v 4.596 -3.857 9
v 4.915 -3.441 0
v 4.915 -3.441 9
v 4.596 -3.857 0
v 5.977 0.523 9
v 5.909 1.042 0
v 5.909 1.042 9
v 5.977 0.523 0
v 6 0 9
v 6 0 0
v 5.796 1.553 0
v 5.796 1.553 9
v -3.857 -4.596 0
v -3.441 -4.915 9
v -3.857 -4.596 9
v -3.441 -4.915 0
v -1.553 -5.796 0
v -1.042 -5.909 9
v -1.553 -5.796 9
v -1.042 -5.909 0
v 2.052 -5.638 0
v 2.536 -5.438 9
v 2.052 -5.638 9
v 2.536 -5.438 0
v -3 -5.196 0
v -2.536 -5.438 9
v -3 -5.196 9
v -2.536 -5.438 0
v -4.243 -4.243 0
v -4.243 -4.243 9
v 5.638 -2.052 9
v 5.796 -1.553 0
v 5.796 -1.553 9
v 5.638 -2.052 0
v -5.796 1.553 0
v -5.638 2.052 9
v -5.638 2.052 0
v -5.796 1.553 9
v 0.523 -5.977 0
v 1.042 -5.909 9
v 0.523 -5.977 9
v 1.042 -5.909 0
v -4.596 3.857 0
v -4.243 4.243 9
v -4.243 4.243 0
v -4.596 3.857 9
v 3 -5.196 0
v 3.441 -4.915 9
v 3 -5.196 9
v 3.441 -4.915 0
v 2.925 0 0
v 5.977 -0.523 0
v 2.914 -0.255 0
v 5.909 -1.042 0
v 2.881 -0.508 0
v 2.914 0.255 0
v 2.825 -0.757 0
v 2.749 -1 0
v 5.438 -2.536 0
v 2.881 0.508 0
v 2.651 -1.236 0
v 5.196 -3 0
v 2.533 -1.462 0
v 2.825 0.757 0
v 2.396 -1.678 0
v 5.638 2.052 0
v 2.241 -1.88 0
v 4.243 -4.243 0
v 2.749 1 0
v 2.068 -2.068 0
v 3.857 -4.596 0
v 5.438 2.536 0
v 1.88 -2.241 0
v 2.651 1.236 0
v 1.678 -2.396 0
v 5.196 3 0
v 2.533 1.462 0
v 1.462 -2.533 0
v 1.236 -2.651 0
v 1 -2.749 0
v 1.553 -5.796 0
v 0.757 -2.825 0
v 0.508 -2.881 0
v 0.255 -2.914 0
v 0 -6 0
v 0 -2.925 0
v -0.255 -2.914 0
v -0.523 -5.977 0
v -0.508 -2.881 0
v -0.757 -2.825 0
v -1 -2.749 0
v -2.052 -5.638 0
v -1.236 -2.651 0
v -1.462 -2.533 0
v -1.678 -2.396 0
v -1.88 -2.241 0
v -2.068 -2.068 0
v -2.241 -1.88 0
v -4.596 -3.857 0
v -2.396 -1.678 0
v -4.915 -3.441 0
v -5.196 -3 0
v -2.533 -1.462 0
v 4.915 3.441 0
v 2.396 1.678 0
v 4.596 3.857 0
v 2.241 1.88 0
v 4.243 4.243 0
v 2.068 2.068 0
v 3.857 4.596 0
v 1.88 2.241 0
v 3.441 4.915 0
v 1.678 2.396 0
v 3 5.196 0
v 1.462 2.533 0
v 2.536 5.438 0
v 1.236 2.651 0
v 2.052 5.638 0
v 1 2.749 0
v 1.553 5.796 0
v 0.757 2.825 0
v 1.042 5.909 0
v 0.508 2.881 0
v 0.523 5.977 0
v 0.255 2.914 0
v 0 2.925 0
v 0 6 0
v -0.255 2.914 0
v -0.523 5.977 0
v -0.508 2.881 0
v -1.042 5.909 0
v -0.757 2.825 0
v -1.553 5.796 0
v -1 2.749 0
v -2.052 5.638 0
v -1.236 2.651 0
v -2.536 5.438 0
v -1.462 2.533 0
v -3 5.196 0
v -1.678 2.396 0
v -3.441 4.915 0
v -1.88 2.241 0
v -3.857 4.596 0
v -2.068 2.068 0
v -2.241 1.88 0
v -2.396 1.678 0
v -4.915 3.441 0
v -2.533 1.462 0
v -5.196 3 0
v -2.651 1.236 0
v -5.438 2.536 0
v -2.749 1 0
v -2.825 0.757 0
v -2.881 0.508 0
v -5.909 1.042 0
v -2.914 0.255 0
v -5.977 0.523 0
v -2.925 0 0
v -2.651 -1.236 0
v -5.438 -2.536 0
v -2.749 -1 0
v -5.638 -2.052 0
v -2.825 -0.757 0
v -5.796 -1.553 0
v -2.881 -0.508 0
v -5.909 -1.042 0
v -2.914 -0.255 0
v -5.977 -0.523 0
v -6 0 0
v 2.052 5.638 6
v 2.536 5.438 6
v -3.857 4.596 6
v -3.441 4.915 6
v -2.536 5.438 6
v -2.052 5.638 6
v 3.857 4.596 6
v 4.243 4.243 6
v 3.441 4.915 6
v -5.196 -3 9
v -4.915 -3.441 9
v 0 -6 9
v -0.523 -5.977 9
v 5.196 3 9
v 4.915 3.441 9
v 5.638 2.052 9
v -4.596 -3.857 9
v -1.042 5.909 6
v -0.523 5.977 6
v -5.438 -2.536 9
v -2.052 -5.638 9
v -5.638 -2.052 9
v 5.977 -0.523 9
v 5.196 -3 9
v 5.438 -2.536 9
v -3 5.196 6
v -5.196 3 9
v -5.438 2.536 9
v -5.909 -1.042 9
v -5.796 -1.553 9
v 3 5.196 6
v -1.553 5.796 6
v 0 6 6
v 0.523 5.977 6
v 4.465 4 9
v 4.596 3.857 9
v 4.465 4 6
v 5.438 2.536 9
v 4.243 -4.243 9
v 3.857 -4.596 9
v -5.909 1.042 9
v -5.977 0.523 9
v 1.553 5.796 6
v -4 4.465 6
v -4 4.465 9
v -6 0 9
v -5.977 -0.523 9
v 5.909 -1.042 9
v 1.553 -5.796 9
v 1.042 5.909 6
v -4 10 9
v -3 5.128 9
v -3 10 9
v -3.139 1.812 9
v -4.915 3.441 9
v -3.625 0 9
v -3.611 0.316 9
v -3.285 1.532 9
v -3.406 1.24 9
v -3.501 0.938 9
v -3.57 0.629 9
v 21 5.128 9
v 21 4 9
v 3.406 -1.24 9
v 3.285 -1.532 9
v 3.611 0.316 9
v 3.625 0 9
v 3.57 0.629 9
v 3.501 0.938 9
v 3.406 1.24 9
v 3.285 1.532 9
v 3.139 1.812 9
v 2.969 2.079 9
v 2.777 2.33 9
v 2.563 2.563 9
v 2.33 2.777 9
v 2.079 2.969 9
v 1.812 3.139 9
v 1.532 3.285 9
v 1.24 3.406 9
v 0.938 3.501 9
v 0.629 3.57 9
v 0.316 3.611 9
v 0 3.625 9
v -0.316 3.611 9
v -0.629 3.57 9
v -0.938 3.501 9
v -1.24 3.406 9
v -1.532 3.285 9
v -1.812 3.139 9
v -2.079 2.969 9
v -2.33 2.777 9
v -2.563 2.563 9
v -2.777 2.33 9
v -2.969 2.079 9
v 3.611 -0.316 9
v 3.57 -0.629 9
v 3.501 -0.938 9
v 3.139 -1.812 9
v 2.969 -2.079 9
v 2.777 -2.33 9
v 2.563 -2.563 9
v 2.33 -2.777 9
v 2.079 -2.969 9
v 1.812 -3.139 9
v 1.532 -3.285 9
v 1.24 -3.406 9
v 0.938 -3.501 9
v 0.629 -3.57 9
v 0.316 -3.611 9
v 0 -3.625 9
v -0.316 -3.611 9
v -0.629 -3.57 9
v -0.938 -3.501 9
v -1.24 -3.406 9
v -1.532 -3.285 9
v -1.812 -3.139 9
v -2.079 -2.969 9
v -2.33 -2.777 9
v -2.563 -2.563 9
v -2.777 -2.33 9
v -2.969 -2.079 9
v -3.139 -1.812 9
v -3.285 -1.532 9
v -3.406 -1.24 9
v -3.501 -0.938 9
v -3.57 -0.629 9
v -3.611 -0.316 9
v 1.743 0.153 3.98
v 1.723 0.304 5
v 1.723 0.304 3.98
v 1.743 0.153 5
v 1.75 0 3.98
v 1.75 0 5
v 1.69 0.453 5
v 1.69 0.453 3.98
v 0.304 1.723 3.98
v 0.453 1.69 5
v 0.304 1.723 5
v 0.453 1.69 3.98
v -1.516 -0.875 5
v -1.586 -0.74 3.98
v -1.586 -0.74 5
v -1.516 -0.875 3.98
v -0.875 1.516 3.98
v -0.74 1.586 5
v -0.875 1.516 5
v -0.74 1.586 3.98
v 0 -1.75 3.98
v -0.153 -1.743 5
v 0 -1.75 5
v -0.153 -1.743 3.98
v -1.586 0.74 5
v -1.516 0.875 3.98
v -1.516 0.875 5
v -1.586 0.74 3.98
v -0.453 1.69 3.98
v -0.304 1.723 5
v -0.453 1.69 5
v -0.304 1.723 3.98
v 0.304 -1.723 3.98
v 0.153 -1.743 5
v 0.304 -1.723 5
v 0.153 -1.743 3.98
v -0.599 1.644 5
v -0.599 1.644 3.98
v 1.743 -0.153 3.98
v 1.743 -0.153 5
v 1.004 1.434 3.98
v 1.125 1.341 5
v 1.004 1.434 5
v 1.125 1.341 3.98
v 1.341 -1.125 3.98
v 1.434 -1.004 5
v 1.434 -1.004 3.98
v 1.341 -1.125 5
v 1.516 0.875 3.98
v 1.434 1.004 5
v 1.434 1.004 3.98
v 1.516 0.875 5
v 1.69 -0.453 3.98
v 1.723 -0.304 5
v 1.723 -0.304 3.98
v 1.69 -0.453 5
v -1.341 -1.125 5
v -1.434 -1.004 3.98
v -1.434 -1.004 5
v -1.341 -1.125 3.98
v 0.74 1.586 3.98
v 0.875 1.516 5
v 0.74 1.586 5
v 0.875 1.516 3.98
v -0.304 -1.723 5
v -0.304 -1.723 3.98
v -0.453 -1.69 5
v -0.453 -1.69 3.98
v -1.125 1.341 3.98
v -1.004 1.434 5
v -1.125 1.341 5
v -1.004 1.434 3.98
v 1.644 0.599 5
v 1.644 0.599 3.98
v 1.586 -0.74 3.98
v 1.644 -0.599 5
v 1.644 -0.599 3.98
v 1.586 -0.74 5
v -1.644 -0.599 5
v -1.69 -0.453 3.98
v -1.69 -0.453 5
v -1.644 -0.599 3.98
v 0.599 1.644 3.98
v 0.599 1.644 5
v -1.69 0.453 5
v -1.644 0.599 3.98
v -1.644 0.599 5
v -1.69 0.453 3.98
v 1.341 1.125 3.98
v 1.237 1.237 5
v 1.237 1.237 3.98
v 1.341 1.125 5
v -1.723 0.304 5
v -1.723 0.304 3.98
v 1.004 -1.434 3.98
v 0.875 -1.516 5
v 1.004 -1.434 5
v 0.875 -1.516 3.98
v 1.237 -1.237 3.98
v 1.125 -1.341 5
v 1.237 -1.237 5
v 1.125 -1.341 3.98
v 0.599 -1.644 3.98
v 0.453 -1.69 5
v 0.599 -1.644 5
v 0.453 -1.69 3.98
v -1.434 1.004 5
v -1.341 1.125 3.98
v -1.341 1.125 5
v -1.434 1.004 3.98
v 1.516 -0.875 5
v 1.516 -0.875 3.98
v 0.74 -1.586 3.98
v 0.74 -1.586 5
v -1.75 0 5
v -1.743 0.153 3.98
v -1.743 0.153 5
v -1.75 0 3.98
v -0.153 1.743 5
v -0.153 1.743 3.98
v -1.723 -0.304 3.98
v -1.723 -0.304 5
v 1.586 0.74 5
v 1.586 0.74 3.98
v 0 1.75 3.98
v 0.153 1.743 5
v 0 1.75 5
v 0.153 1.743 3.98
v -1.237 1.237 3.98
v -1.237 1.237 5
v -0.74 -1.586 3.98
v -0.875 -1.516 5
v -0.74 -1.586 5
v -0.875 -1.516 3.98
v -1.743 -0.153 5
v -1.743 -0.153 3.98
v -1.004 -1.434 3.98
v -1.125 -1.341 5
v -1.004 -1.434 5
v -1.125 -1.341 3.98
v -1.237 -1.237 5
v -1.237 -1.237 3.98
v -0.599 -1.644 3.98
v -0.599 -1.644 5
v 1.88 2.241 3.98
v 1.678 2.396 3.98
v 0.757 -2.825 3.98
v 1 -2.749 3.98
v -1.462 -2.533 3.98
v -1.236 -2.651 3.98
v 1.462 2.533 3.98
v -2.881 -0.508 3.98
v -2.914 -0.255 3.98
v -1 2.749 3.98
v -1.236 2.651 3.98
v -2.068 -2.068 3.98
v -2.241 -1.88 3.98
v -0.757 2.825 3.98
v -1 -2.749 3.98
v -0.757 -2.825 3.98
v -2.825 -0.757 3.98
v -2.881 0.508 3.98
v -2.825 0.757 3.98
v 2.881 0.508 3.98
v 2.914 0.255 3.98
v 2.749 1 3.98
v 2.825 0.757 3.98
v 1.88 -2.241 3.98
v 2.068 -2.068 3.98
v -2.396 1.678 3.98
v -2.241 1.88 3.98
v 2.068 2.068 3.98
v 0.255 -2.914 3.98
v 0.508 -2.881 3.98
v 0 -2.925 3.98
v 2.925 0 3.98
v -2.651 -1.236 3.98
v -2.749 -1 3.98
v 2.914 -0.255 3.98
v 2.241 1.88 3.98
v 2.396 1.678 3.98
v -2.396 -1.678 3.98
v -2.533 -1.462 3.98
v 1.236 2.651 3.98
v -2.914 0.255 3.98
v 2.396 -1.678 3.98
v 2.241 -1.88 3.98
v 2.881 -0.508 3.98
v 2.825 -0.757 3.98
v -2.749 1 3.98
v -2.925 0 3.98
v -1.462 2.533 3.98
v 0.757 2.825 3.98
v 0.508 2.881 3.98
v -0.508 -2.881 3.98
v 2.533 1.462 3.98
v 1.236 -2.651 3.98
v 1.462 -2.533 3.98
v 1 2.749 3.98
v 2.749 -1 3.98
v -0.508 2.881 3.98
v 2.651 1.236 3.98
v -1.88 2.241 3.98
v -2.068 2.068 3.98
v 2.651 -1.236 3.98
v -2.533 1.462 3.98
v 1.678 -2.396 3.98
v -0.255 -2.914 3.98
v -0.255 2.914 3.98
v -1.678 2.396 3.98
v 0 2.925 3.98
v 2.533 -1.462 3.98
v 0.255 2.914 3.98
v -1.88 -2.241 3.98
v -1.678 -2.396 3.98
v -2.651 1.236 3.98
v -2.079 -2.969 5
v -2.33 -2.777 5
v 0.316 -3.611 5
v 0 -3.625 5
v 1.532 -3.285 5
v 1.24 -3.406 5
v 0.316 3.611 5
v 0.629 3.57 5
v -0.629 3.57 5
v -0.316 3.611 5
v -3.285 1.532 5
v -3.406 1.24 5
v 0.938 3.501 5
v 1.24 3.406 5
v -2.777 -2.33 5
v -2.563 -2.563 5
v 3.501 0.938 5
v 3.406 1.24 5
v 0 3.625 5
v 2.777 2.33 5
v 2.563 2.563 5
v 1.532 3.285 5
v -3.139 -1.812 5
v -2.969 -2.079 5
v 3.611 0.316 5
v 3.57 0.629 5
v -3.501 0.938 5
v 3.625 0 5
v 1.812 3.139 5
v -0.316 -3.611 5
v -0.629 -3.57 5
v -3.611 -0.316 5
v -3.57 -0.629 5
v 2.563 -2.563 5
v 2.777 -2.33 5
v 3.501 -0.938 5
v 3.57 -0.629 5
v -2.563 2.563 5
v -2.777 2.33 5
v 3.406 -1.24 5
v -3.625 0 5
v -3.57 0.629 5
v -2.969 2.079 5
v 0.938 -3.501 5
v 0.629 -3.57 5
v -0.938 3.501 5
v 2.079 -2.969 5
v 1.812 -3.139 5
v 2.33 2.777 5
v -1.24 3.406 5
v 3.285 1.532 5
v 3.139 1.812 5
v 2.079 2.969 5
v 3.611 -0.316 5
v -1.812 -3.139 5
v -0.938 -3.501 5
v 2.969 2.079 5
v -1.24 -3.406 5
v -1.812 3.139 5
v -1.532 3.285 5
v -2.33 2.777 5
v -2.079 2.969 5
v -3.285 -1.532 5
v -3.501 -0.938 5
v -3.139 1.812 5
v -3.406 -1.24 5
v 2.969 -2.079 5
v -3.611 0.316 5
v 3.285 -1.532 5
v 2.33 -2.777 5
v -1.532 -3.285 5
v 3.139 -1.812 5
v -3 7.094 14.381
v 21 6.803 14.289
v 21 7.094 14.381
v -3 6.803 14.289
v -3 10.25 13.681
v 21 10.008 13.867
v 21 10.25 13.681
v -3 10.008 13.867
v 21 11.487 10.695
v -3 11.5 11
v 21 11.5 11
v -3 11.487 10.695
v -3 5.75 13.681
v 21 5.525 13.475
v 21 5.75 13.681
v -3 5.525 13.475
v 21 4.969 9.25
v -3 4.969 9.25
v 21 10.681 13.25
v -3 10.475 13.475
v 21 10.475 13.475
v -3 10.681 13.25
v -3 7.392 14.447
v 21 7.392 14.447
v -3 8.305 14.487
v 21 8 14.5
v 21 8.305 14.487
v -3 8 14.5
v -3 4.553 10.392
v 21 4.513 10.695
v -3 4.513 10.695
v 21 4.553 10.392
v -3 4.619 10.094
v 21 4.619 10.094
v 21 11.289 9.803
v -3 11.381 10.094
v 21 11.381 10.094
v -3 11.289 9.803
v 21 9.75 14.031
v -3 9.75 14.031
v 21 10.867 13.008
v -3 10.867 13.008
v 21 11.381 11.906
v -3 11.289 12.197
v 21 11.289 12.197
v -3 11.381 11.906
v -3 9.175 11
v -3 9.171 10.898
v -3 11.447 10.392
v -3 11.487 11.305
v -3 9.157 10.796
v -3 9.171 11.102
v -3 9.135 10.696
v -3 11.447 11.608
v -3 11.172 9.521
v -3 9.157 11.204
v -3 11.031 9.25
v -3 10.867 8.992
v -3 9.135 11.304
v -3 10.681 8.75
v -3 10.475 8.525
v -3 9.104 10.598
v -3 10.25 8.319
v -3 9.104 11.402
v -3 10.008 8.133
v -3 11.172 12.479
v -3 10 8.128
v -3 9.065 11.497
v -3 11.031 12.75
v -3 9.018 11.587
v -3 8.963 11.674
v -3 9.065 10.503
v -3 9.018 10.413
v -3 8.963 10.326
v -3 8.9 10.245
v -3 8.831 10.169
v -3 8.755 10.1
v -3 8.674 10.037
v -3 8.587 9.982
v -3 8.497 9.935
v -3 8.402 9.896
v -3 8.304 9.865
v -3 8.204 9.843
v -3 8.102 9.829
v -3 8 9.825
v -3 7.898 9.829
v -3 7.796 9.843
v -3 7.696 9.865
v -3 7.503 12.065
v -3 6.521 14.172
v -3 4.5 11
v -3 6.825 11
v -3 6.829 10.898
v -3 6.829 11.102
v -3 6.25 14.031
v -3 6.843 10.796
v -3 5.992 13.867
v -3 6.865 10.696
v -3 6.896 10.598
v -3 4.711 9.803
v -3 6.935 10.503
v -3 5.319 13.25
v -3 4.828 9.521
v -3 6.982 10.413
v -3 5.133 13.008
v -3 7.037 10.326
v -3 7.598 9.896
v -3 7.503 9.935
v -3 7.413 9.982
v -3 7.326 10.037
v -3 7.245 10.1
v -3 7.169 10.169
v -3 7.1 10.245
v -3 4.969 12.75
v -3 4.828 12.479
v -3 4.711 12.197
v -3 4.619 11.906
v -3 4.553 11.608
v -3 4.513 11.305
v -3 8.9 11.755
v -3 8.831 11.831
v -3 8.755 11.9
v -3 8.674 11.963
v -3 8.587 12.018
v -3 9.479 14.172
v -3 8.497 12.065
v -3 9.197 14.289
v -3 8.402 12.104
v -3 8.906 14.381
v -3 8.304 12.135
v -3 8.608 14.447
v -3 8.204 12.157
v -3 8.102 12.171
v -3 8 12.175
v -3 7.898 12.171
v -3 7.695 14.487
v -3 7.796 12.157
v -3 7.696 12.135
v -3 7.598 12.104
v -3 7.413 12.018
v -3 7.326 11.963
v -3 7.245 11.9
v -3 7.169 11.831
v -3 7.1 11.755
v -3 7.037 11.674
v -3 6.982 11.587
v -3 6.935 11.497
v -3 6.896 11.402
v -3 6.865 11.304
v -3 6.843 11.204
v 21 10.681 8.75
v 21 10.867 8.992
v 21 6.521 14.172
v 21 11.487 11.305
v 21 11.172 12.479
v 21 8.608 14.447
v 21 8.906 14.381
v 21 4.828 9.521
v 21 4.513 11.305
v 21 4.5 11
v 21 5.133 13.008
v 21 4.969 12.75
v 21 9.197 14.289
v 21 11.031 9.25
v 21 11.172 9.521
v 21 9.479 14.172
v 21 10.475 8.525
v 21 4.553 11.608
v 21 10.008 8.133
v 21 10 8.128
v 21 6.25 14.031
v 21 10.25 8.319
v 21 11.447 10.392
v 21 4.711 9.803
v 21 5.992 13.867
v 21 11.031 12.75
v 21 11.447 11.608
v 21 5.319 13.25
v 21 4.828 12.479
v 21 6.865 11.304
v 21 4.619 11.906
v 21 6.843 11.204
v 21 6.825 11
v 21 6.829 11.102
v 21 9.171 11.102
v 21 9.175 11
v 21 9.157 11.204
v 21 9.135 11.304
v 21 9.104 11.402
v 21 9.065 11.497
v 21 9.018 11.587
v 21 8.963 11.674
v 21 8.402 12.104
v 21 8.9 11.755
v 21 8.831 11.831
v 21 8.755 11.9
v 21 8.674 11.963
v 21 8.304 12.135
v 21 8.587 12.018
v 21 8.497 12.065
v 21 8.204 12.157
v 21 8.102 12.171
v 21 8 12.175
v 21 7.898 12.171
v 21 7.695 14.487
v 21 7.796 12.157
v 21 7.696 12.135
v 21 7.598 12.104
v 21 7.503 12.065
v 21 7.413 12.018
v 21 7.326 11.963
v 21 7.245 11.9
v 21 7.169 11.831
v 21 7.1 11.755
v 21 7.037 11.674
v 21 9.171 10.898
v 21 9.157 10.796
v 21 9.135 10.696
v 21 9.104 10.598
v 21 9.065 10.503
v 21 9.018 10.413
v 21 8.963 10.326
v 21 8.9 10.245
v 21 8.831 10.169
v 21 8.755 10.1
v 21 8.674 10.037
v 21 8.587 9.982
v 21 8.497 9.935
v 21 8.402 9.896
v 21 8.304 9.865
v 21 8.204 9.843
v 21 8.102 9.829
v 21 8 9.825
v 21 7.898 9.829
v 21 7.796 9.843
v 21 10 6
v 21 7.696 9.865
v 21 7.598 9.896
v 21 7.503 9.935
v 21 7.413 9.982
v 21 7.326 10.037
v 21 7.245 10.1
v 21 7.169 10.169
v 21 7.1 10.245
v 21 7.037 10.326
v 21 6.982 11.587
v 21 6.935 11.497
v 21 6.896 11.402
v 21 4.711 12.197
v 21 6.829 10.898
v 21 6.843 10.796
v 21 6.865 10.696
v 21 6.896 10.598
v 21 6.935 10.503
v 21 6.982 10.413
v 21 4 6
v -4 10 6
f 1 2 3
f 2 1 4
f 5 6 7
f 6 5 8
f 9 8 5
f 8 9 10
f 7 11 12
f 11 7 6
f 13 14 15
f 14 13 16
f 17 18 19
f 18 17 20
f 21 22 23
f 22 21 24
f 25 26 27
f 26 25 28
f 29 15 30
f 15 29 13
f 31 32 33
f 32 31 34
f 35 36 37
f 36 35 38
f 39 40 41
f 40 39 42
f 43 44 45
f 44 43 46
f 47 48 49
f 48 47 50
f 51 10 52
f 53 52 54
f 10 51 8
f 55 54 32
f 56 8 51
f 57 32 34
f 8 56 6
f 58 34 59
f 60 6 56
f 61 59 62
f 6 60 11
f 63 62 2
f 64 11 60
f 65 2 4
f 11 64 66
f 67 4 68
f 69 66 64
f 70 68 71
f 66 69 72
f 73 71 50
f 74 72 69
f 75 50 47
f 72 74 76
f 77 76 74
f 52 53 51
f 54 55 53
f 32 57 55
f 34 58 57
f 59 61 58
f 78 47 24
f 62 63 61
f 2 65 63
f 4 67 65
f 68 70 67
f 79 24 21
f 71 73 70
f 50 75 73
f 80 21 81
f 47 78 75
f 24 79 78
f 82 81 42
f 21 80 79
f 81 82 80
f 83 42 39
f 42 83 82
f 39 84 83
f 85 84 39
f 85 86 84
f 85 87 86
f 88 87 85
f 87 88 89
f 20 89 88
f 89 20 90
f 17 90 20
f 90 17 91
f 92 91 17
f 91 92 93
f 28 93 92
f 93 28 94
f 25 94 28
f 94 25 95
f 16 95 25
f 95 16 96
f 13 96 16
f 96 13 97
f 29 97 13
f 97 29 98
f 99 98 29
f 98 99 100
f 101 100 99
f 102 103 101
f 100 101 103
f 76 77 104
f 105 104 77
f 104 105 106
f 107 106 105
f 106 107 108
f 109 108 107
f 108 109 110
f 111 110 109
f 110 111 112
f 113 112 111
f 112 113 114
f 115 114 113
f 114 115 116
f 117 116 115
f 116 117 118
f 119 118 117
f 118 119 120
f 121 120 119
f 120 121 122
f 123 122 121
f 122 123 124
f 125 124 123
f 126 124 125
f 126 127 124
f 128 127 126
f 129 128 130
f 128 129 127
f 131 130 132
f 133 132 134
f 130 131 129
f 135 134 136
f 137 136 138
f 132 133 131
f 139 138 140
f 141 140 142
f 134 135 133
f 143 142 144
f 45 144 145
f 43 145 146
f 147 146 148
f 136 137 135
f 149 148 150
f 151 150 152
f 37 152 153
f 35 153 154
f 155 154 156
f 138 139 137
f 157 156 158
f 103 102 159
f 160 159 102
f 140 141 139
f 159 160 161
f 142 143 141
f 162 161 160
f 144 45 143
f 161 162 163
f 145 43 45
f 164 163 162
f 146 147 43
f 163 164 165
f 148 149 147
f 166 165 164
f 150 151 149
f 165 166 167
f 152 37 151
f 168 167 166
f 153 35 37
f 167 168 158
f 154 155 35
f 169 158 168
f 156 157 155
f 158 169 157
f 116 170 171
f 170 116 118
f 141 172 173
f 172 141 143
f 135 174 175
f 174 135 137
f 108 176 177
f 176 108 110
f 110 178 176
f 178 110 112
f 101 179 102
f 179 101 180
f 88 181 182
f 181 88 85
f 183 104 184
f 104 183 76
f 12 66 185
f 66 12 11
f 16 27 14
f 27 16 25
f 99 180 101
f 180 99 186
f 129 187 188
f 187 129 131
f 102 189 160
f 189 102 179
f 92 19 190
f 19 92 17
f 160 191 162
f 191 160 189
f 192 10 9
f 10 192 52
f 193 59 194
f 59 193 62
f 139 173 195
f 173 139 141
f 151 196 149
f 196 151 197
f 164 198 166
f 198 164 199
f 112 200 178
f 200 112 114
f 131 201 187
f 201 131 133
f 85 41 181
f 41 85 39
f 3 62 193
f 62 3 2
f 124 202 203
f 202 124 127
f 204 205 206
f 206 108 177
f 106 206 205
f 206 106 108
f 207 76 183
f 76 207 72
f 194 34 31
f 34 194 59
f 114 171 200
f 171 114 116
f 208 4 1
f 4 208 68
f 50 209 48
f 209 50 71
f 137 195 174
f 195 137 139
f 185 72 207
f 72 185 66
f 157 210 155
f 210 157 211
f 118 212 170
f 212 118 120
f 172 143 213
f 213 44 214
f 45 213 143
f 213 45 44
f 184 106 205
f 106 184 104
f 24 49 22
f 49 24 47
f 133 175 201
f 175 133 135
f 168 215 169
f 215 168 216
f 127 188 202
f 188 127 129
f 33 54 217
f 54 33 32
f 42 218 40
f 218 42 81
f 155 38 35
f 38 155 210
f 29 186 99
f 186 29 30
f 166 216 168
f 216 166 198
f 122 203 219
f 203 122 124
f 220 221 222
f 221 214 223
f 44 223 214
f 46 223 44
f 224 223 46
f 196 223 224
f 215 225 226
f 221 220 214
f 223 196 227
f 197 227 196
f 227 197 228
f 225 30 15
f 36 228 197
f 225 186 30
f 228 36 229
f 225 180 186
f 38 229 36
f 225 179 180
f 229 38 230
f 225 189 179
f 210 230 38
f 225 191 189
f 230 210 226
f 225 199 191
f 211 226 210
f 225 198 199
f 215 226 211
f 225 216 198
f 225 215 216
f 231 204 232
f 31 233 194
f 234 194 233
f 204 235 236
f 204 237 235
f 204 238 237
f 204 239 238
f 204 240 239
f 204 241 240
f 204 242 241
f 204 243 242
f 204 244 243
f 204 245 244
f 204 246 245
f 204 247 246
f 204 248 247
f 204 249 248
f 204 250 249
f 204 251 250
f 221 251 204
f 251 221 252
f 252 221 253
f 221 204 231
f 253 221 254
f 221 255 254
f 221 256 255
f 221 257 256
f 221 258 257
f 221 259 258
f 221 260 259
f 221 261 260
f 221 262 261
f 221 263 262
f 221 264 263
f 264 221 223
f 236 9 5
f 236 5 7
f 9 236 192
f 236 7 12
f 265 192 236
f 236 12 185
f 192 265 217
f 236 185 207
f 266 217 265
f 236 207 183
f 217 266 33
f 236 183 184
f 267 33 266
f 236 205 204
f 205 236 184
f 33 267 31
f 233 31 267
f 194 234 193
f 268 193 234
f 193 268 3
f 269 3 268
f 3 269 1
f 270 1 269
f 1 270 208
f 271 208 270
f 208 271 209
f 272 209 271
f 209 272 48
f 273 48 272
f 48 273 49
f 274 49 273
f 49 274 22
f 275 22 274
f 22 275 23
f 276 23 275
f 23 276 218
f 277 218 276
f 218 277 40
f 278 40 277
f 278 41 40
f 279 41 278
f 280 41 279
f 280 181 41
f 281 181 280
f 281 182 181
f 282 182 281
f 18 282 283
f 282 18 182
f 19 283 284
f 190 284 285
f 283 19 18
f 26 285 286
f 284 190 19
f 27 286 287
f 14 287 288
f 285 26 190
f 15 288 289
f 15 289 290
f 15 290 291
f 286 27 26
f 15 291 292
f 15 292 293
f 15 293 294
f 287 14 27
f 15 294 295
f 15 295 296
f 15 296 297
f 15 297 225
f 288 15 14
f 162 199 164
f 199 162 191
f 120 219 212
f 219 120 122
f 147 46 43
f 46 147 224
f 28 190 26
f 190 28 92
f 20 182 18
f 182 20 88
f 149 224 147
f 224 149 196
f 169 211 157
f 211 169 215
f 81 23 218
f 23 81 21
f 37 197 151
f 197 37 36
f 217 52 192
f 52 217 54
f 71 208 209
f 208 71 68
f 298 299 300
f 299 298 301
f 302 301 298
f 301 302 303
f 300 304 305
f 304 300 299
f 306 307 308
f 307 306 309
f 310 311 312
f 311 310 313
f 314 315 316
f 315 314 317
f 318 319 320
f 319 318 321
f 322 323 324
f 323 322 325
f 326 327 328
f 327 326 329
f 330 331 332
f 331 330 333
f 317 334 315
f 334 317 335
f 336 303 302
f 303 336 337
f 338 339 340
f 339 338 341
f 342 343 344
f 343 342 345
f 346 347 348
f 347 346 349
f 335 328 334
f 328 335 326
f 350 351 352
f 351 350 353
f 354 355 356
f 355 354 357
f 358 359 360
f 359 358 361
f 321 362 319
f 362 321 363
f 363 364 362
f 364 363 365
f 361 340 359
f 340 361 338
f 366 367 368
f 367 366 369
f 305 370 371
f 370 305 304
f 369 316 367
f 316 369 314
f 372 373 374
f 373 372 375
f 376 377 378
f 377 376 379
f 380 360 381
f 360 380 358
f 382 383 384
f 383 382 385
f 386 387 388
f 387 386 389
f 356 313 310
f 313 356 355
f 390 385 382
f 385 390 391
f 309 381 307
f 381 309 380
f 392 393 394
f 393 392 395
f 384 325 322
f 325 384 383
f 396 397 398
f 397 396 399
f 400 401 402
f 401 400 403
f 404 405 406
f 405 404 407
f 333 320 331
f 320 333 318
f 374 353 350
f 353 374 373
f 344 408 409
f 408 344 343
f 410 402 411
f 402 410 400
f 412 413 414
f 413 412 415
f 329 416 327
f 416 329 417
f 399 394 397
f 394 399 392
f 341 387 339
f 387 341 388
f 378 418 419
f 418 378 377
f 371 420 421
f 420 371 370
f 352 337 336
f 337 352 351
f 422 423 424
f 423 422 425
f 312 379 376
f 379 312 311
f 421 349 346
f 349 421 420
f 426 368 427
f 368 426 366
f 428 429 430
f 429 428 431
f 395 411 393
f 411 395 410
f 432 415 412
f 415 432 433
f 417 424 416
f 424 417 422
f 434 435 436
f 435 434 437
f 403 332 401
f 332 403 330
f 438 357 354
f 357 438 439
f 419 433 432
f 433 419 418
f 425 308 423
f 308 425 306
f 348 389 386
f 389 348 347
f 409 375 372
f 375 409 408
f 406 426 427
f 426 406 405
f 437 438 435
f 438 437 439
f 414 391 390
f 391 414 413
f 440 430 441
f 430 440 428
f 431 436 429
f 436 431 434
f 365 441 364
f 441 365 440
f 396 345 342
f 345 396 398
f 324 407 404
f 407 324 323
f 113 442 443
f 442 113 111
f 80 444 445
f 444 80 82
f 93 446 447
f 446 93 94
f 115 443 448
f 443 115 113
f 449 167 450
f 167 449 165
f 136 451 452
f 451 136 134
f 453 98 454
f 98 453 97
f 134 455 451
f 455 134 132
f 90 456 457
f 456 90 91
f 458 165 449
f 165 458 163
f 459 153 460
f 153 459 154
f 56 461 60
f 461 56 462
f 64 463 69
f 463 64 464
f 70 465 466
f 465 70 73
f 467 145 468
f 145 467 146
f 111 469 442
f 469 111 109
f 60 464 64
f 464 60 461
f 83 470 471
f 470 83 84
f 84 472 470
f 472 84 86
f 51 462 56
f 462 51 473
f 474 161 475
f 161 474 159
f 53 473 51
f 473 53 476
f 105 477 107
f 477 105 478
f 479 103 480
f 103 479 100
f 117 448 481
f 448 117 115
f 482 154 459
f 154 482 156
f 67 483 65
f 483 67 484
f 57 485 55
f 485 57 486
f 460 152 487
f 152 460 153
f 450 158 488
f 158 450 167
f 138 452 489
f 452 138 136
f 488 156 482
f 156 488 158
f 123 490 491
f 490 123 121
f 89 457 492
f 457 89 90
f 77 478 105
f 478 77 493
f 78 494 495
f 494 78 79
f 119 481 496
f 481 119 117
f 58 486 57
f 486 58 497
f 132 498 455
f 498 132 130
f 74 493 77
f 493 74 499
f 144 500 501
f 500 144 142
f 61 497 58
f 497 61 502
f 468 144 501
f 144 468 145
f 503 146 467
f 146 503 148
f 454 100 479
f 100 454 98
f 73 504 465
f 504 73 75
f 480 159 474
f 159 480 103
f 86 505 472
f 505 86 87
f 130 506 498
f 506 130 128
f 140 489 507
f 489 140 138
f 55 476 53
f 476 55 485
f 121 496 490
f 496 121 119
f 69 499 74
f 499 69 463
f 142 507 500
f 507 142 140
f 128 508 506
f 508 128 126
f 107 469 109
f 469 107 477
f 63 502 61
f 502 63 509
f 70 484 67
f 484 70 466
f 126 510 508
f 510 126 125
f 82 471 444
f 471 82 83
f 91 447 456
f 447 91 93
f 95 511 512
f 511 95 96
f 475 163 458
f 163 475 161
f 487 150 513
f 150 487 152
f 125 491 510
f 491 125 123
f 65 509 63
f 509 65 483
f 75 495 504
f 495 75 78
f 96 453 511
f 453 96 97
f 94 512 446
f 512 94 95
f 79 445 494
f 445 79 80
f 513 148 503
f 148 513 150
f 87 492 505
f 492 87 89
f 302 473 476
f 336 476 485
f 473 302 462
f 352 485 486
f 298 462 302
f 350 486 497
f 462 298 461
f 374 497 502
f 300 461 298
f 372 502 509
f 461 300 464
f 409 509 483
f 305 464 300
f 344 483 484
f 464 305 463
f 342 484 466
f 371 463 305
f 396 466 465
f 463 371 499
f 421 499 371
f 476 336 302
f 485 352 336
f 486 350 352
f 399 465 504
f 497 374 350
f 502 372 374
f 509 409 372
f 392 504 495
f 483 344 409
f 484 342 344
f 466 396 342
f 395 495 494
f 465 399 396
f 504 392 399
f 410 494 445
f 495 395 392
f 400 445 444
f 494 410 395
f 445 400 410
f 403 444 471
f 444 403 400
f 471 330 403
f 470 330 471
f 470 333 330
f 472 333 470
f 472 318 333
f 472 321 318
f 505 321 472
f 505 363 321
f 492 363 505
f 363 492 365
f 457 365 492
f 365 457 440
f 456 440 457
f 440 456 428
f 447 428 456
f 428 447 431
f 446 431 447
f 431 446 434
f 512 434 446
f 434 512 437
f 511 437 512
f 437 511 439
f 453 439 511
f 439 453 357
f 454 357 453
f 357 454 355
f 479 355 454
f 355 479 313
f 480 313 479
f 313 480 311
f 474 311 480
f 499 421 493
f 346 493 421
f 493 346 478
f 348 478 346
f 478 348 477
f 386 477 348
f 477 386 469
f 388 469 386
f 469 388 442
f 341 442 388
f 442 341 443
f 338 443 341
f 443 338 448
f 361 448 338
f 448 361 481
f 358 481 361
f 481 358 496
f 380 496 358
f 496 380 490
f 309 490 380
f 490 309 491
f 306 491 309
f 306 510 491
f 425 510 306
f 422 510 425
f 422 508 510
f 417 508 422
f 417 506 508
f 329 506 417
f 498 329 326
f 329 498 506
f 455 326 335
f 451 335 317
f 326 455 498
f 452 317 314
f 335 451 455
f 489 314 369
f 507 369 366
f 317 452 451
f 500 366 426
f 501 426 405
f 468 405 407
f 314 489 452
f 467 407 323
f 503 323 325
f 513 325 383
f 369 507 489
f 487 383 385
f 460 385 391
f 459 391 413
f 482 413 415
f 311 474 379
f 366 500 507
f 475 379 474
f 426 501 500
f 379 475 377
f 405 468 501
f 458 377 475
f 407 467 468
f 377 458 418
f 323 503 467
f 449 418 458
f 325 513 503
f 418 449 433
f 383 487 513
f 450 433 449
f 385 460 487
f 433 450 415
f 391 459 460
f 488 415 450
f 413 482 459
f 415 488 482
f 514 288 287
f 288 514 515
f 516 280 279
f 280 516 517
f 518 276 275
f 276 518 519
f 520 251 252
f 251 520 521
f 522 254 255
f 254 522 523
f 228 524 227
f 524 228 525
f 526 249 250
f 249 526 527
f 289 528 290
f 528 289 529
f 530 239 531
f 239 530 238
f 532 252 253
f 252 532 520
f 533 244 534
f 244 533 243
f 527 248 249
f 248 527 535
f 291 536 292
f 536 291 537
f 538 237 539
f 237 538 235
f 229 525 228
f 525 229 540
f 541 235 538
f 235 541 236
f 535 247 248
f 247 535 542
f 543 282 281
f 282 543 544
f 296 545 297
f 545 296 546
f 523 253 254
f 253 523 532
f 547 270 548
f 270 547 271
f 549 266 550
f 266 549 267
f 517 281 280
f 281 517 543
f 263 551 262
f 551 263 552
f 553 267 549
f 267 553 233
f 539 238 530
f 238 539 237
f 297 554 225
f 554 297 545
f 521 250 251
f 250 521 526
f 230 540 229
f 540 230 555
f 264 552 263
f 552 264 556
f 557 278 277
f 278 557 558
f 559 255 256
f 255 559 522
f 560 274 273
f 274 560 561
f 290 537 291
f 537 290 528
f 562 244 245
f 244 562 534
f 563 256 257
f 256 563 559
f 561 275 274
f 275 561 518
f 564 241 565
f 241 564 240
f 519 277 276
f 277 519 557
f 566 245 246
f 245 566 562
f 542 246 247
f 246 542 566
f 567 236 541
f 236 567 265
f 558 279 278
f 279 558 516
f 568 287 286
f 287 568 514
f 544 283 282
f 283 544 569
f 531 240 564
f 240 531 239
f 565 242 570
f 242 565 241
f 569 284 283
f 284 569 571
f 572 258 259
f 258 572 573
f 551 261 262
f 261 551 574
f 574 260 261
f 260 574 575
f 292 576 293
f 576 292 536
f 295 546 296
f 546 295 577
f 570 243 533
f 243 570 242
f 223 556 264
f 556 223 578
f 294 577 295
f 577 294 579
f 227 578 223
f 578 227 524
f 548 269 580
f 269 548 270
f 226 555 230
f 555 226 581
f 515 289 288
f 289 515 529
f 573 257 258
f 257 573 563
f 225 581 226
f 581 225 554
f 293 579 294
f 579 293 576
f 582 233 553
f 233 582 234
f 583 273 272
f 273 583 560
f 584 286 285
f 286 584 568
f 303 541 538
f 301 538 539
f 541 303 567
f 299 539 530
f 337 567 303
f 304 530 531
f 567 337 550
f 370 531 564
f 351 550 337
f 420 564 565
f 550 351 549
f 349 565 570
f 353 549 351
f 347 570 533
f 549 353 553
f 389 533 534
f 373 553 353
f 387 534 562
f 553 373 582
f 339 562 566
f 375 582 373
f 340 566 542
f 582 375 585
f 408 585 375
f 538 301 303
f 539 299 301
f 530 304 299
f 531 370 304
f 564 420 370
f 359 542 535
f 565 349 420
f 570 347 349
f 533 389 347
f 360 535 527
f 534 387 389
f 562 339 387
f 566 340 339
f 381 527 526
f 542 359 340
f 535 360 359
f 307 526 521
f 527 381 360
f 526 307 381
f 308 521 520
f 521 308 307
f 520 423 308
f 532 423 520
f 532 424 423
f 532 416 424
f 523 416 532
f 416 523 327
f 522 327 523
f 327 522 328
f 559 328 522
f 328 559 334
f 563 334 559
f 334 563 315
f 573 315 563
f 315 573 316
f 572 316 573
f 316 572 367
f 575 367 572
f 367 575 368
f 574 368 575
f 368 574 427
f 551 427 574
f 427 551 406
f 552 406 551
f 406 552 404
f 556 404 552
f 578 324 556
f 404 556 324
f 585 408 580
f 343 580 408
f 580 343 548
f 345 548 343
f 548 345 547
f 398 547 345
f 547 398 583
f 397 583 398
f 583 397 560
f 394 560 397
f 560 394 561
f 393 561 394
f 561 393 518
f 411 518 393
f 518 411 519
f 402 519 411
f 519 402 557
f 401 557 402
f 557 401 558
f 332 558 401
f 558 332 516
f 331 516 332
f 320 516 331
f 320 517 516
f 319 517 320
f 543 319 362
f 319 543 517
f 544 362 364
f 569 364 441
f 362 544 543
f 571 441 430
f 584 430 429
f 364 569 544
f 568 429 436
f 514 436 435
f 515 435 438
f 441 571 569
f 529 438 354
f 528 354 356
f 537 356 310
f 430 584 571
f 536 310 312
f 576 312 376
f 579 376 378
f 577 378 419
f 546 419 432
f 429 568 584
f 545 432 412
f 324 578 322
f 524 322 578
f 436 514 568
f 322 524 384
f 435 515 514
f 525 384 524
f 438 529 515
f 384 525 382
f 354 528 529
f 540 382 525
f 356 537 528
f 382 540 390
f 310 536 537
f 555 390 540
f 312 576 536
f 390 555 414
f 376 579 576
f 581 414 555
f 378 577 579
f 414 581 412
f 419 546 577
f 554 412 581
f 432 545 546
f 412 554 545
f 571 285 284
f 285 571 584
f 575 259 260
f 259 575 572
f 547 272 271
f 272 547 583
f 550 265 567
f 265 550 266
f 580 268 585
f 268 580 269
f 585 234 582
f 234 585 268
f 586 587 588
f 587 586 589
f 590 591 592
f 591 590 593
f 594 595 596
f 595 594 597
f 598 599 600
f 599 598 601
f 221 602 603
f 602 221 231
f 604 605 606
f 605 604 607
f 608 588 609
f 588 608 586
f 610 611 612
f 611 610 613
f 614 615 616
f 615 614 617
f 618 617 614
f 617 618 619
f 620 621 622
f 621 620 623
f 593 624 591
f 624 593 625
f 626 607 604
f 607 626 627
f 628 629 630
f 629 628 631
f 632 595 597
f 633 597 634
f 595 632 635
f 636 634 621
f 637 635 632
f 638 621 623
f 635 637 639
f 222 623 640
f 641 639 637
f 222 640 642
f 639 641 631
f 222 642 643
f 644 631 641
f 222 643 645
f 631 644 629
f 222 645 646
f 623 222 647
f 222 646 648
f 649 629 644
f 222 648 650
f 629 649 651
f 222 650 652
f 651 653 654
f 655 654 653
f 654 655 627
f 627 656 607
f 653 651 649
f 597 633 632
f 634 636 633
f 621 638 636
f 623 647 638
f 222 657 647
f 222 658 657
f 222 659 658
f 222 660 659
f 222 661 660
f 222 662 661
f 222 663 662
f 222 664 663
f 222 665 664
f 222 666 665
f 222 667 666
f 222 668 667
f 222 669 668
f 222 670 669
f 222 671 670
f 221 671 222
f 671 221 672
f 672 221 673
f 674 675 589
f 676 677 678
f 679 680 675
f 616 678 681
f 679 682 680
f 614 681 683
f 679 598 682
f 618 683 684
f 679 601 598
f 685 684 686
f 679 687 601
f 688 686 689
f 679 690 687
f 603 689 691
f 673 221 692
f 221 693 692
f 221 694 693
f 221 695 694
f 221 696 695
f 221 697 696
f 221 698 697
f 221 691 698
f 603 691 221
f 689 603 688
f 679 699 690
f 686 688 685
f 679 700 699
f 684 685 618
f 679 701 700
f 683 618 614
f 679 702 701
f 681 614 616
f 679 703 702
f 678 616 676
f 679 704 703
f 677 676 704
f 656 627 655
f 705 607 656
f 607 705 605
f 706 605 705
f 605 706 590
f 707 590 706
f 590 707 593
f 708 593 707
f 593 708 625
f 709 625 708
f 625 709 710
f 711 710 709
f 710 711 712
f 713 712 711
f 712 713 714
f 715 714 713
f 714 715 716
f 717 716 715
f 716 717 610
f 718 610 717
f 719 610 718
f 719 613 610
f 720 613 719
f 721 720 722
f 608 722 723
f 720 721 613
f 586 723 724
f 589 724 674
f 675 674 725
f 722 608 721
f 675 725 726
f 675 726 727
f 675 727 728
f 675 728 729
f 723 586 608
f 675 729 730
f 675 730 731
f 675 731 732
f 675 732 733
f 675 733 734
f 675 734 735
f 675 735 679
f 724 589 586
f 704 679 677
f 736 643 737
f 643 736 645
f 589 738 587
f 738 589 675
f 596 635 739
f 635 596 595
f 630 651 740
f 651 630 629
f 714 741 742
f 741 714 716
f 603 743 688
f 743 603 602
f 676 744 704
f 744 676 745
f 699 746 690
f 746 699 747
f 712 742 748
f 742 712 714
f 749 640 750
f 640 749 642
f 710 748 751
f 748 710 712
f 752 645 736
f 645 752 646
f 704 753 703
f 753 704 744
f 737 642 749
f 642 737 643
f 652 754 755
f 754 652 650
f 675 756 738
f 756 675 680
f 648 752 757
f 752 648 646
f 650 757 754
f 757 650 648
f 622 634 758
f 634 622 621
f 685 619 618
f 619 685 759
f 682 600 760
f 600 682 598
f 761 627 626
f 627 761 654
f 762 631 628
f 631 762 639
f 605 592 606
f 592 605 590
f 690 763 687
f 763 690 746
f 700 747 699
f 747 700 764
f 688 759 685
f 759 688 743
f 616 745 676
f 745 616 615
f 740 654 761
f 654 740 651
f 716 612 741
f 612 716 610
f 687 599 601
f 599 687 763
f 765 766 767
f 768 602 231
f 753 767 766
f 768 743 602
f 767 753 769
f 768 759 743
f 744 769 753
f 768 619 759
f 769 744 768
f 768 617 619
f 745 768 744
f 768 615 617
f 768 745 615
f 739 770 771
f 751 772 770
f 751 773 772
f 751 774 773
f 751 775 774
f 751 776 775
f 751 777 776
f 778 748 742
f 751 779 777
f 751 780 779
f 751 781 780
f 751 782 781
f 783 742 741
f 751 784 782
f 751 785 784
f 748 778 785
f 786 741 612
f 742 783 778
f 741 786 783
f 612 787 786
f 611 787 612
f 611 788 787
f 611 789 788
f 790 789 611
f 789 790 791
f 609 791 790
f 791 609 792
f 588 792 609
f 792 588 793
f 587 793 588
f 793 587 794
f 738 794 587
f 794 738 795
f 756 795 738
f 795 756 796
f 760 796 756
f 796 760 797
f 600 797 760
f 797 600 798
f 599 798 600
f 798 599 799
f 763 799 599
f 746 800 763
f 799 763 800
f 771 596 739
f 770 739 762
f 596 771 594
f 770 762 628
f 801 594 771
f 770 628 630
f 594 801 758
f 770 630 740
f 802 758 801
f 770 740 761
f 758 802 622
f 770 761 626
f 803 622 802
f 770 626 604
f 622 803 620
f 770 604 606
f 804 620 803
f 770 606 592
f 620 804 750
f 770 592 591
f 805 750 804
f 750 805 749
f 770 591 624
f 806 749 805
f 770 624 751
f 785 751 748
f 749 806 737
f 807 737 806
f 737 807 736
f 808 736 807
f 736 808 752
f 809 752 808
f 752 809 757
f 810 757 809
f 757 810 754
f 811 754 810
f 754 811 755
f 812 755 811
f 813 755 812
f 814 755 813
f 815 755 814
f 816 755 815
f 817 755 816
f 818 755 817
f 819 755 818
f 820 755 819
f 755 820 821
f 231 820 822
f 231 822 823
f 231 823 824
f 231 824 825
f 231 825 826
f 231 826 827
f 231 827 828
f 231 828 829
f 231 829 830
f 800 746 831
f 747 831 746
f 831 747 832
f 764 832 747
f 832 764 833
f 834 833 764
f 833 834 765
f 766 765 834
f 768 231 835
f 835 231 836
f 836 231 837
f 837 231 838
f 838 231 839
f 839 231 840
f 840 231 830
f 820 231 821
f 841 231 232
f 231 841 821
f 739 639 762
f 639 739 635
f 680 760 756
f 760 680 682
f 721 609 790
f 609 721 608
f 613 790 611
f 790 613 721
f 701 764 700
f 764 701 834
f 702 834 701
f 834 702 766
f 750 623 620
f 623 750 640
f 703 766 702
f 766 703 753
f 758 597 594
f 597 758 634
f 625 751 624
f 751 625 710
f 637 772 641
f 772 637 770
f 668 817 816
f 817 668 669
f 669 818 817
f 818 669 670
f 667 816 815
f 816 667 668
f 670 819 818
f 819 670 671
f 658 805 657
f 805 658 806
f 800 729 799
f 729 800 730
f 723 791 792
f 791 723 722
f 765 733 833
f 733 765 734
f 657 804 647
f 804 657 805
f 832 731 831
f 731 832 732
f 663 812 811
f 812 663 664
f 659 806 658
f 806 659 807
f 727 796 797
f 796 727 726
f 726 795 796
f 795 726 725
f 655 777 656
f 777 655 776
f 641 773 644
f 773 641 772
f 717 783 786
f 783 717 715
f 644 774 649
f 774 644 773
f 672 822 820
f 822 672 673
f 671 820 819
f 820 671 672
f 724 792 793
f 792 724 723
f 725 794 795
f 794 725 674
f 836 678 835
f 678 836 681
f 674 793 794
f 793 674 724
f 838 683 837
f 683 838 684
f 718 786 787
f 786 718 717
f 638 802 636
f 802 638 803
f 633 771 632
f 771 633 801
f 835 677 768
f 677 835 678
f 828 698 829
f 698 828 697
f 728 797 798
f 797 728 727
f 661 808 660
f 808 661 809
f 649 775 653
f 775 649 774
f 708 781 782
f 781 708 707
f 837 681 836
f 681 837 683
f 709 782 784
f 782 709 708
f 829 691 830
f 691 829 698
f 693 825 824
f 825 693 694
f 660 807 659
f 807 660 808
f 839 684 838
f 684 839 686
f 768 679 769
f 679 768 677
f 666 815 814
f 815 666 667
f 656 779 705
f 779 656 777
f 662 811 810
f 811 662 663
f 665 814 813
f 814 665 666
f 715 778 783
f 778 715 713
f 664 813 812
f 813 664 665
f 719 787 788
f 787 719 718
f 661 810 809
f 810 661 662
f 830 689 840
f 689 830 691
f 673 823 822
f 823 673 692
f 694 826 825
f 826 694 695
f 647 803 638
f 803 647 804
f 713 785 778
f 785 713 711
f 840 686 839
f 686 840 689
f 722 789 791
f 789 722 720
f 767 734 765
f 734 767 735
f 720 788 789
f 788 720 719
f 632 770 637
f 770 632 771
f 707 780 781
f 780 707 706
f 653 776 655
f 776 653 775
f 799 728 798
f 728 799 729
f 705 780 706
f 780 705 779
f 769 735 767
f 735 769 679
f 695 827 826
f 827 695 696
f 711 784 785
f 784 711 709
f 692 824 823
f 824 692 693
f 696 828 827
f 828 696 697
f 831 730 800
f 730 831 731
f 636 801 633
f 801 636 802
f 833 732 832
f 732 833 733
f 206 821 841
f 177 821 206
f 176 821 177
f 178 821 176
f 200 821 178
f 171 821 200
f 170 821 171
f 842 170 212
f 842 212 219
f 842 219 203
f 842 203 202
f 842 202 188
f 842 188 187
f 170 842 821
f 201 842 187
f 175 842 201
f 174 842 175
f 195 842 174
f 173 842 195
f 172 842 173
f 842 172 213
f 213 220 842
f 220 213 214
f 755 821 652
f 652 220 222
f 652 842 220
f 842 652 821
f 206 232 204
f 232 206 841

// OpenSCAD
// brass rod holder

// outer hole 5.85
// screw hole 3.5
// sleeve depth 4.0
// outer diameter 8.0
// rod diameter 2.35

$fn=72;
difference() {
    cylinder(h=9,d=12);
    translate([0,0,-0.01])
    cylinder(h=10,d=3.5); // screw hole
    translate([0,0,-0.02])
    cylinder(h=4,d=5.85);
    translate([0,0,5])
    cylinder(d=7.25,h=5);
}

color("red")
translate([-4,4,6])
cube([25,6,3]);

rotate([0,90,0])

translate([-11,8,-3])
difference() {
    color("green")
    cylinder(d=7,h=24);
    translate([0,0,-0.01])
    cylinder(d=2.35,h=25.1);
}



/*
rotate([0,90,0])
translate([-11,8,15])
difference() {
    color("green")
    cylinder(d=7,h=5);
    translate([0,0,-0.01])
    cylinder(d=2.35,h=5.1);
}*/
